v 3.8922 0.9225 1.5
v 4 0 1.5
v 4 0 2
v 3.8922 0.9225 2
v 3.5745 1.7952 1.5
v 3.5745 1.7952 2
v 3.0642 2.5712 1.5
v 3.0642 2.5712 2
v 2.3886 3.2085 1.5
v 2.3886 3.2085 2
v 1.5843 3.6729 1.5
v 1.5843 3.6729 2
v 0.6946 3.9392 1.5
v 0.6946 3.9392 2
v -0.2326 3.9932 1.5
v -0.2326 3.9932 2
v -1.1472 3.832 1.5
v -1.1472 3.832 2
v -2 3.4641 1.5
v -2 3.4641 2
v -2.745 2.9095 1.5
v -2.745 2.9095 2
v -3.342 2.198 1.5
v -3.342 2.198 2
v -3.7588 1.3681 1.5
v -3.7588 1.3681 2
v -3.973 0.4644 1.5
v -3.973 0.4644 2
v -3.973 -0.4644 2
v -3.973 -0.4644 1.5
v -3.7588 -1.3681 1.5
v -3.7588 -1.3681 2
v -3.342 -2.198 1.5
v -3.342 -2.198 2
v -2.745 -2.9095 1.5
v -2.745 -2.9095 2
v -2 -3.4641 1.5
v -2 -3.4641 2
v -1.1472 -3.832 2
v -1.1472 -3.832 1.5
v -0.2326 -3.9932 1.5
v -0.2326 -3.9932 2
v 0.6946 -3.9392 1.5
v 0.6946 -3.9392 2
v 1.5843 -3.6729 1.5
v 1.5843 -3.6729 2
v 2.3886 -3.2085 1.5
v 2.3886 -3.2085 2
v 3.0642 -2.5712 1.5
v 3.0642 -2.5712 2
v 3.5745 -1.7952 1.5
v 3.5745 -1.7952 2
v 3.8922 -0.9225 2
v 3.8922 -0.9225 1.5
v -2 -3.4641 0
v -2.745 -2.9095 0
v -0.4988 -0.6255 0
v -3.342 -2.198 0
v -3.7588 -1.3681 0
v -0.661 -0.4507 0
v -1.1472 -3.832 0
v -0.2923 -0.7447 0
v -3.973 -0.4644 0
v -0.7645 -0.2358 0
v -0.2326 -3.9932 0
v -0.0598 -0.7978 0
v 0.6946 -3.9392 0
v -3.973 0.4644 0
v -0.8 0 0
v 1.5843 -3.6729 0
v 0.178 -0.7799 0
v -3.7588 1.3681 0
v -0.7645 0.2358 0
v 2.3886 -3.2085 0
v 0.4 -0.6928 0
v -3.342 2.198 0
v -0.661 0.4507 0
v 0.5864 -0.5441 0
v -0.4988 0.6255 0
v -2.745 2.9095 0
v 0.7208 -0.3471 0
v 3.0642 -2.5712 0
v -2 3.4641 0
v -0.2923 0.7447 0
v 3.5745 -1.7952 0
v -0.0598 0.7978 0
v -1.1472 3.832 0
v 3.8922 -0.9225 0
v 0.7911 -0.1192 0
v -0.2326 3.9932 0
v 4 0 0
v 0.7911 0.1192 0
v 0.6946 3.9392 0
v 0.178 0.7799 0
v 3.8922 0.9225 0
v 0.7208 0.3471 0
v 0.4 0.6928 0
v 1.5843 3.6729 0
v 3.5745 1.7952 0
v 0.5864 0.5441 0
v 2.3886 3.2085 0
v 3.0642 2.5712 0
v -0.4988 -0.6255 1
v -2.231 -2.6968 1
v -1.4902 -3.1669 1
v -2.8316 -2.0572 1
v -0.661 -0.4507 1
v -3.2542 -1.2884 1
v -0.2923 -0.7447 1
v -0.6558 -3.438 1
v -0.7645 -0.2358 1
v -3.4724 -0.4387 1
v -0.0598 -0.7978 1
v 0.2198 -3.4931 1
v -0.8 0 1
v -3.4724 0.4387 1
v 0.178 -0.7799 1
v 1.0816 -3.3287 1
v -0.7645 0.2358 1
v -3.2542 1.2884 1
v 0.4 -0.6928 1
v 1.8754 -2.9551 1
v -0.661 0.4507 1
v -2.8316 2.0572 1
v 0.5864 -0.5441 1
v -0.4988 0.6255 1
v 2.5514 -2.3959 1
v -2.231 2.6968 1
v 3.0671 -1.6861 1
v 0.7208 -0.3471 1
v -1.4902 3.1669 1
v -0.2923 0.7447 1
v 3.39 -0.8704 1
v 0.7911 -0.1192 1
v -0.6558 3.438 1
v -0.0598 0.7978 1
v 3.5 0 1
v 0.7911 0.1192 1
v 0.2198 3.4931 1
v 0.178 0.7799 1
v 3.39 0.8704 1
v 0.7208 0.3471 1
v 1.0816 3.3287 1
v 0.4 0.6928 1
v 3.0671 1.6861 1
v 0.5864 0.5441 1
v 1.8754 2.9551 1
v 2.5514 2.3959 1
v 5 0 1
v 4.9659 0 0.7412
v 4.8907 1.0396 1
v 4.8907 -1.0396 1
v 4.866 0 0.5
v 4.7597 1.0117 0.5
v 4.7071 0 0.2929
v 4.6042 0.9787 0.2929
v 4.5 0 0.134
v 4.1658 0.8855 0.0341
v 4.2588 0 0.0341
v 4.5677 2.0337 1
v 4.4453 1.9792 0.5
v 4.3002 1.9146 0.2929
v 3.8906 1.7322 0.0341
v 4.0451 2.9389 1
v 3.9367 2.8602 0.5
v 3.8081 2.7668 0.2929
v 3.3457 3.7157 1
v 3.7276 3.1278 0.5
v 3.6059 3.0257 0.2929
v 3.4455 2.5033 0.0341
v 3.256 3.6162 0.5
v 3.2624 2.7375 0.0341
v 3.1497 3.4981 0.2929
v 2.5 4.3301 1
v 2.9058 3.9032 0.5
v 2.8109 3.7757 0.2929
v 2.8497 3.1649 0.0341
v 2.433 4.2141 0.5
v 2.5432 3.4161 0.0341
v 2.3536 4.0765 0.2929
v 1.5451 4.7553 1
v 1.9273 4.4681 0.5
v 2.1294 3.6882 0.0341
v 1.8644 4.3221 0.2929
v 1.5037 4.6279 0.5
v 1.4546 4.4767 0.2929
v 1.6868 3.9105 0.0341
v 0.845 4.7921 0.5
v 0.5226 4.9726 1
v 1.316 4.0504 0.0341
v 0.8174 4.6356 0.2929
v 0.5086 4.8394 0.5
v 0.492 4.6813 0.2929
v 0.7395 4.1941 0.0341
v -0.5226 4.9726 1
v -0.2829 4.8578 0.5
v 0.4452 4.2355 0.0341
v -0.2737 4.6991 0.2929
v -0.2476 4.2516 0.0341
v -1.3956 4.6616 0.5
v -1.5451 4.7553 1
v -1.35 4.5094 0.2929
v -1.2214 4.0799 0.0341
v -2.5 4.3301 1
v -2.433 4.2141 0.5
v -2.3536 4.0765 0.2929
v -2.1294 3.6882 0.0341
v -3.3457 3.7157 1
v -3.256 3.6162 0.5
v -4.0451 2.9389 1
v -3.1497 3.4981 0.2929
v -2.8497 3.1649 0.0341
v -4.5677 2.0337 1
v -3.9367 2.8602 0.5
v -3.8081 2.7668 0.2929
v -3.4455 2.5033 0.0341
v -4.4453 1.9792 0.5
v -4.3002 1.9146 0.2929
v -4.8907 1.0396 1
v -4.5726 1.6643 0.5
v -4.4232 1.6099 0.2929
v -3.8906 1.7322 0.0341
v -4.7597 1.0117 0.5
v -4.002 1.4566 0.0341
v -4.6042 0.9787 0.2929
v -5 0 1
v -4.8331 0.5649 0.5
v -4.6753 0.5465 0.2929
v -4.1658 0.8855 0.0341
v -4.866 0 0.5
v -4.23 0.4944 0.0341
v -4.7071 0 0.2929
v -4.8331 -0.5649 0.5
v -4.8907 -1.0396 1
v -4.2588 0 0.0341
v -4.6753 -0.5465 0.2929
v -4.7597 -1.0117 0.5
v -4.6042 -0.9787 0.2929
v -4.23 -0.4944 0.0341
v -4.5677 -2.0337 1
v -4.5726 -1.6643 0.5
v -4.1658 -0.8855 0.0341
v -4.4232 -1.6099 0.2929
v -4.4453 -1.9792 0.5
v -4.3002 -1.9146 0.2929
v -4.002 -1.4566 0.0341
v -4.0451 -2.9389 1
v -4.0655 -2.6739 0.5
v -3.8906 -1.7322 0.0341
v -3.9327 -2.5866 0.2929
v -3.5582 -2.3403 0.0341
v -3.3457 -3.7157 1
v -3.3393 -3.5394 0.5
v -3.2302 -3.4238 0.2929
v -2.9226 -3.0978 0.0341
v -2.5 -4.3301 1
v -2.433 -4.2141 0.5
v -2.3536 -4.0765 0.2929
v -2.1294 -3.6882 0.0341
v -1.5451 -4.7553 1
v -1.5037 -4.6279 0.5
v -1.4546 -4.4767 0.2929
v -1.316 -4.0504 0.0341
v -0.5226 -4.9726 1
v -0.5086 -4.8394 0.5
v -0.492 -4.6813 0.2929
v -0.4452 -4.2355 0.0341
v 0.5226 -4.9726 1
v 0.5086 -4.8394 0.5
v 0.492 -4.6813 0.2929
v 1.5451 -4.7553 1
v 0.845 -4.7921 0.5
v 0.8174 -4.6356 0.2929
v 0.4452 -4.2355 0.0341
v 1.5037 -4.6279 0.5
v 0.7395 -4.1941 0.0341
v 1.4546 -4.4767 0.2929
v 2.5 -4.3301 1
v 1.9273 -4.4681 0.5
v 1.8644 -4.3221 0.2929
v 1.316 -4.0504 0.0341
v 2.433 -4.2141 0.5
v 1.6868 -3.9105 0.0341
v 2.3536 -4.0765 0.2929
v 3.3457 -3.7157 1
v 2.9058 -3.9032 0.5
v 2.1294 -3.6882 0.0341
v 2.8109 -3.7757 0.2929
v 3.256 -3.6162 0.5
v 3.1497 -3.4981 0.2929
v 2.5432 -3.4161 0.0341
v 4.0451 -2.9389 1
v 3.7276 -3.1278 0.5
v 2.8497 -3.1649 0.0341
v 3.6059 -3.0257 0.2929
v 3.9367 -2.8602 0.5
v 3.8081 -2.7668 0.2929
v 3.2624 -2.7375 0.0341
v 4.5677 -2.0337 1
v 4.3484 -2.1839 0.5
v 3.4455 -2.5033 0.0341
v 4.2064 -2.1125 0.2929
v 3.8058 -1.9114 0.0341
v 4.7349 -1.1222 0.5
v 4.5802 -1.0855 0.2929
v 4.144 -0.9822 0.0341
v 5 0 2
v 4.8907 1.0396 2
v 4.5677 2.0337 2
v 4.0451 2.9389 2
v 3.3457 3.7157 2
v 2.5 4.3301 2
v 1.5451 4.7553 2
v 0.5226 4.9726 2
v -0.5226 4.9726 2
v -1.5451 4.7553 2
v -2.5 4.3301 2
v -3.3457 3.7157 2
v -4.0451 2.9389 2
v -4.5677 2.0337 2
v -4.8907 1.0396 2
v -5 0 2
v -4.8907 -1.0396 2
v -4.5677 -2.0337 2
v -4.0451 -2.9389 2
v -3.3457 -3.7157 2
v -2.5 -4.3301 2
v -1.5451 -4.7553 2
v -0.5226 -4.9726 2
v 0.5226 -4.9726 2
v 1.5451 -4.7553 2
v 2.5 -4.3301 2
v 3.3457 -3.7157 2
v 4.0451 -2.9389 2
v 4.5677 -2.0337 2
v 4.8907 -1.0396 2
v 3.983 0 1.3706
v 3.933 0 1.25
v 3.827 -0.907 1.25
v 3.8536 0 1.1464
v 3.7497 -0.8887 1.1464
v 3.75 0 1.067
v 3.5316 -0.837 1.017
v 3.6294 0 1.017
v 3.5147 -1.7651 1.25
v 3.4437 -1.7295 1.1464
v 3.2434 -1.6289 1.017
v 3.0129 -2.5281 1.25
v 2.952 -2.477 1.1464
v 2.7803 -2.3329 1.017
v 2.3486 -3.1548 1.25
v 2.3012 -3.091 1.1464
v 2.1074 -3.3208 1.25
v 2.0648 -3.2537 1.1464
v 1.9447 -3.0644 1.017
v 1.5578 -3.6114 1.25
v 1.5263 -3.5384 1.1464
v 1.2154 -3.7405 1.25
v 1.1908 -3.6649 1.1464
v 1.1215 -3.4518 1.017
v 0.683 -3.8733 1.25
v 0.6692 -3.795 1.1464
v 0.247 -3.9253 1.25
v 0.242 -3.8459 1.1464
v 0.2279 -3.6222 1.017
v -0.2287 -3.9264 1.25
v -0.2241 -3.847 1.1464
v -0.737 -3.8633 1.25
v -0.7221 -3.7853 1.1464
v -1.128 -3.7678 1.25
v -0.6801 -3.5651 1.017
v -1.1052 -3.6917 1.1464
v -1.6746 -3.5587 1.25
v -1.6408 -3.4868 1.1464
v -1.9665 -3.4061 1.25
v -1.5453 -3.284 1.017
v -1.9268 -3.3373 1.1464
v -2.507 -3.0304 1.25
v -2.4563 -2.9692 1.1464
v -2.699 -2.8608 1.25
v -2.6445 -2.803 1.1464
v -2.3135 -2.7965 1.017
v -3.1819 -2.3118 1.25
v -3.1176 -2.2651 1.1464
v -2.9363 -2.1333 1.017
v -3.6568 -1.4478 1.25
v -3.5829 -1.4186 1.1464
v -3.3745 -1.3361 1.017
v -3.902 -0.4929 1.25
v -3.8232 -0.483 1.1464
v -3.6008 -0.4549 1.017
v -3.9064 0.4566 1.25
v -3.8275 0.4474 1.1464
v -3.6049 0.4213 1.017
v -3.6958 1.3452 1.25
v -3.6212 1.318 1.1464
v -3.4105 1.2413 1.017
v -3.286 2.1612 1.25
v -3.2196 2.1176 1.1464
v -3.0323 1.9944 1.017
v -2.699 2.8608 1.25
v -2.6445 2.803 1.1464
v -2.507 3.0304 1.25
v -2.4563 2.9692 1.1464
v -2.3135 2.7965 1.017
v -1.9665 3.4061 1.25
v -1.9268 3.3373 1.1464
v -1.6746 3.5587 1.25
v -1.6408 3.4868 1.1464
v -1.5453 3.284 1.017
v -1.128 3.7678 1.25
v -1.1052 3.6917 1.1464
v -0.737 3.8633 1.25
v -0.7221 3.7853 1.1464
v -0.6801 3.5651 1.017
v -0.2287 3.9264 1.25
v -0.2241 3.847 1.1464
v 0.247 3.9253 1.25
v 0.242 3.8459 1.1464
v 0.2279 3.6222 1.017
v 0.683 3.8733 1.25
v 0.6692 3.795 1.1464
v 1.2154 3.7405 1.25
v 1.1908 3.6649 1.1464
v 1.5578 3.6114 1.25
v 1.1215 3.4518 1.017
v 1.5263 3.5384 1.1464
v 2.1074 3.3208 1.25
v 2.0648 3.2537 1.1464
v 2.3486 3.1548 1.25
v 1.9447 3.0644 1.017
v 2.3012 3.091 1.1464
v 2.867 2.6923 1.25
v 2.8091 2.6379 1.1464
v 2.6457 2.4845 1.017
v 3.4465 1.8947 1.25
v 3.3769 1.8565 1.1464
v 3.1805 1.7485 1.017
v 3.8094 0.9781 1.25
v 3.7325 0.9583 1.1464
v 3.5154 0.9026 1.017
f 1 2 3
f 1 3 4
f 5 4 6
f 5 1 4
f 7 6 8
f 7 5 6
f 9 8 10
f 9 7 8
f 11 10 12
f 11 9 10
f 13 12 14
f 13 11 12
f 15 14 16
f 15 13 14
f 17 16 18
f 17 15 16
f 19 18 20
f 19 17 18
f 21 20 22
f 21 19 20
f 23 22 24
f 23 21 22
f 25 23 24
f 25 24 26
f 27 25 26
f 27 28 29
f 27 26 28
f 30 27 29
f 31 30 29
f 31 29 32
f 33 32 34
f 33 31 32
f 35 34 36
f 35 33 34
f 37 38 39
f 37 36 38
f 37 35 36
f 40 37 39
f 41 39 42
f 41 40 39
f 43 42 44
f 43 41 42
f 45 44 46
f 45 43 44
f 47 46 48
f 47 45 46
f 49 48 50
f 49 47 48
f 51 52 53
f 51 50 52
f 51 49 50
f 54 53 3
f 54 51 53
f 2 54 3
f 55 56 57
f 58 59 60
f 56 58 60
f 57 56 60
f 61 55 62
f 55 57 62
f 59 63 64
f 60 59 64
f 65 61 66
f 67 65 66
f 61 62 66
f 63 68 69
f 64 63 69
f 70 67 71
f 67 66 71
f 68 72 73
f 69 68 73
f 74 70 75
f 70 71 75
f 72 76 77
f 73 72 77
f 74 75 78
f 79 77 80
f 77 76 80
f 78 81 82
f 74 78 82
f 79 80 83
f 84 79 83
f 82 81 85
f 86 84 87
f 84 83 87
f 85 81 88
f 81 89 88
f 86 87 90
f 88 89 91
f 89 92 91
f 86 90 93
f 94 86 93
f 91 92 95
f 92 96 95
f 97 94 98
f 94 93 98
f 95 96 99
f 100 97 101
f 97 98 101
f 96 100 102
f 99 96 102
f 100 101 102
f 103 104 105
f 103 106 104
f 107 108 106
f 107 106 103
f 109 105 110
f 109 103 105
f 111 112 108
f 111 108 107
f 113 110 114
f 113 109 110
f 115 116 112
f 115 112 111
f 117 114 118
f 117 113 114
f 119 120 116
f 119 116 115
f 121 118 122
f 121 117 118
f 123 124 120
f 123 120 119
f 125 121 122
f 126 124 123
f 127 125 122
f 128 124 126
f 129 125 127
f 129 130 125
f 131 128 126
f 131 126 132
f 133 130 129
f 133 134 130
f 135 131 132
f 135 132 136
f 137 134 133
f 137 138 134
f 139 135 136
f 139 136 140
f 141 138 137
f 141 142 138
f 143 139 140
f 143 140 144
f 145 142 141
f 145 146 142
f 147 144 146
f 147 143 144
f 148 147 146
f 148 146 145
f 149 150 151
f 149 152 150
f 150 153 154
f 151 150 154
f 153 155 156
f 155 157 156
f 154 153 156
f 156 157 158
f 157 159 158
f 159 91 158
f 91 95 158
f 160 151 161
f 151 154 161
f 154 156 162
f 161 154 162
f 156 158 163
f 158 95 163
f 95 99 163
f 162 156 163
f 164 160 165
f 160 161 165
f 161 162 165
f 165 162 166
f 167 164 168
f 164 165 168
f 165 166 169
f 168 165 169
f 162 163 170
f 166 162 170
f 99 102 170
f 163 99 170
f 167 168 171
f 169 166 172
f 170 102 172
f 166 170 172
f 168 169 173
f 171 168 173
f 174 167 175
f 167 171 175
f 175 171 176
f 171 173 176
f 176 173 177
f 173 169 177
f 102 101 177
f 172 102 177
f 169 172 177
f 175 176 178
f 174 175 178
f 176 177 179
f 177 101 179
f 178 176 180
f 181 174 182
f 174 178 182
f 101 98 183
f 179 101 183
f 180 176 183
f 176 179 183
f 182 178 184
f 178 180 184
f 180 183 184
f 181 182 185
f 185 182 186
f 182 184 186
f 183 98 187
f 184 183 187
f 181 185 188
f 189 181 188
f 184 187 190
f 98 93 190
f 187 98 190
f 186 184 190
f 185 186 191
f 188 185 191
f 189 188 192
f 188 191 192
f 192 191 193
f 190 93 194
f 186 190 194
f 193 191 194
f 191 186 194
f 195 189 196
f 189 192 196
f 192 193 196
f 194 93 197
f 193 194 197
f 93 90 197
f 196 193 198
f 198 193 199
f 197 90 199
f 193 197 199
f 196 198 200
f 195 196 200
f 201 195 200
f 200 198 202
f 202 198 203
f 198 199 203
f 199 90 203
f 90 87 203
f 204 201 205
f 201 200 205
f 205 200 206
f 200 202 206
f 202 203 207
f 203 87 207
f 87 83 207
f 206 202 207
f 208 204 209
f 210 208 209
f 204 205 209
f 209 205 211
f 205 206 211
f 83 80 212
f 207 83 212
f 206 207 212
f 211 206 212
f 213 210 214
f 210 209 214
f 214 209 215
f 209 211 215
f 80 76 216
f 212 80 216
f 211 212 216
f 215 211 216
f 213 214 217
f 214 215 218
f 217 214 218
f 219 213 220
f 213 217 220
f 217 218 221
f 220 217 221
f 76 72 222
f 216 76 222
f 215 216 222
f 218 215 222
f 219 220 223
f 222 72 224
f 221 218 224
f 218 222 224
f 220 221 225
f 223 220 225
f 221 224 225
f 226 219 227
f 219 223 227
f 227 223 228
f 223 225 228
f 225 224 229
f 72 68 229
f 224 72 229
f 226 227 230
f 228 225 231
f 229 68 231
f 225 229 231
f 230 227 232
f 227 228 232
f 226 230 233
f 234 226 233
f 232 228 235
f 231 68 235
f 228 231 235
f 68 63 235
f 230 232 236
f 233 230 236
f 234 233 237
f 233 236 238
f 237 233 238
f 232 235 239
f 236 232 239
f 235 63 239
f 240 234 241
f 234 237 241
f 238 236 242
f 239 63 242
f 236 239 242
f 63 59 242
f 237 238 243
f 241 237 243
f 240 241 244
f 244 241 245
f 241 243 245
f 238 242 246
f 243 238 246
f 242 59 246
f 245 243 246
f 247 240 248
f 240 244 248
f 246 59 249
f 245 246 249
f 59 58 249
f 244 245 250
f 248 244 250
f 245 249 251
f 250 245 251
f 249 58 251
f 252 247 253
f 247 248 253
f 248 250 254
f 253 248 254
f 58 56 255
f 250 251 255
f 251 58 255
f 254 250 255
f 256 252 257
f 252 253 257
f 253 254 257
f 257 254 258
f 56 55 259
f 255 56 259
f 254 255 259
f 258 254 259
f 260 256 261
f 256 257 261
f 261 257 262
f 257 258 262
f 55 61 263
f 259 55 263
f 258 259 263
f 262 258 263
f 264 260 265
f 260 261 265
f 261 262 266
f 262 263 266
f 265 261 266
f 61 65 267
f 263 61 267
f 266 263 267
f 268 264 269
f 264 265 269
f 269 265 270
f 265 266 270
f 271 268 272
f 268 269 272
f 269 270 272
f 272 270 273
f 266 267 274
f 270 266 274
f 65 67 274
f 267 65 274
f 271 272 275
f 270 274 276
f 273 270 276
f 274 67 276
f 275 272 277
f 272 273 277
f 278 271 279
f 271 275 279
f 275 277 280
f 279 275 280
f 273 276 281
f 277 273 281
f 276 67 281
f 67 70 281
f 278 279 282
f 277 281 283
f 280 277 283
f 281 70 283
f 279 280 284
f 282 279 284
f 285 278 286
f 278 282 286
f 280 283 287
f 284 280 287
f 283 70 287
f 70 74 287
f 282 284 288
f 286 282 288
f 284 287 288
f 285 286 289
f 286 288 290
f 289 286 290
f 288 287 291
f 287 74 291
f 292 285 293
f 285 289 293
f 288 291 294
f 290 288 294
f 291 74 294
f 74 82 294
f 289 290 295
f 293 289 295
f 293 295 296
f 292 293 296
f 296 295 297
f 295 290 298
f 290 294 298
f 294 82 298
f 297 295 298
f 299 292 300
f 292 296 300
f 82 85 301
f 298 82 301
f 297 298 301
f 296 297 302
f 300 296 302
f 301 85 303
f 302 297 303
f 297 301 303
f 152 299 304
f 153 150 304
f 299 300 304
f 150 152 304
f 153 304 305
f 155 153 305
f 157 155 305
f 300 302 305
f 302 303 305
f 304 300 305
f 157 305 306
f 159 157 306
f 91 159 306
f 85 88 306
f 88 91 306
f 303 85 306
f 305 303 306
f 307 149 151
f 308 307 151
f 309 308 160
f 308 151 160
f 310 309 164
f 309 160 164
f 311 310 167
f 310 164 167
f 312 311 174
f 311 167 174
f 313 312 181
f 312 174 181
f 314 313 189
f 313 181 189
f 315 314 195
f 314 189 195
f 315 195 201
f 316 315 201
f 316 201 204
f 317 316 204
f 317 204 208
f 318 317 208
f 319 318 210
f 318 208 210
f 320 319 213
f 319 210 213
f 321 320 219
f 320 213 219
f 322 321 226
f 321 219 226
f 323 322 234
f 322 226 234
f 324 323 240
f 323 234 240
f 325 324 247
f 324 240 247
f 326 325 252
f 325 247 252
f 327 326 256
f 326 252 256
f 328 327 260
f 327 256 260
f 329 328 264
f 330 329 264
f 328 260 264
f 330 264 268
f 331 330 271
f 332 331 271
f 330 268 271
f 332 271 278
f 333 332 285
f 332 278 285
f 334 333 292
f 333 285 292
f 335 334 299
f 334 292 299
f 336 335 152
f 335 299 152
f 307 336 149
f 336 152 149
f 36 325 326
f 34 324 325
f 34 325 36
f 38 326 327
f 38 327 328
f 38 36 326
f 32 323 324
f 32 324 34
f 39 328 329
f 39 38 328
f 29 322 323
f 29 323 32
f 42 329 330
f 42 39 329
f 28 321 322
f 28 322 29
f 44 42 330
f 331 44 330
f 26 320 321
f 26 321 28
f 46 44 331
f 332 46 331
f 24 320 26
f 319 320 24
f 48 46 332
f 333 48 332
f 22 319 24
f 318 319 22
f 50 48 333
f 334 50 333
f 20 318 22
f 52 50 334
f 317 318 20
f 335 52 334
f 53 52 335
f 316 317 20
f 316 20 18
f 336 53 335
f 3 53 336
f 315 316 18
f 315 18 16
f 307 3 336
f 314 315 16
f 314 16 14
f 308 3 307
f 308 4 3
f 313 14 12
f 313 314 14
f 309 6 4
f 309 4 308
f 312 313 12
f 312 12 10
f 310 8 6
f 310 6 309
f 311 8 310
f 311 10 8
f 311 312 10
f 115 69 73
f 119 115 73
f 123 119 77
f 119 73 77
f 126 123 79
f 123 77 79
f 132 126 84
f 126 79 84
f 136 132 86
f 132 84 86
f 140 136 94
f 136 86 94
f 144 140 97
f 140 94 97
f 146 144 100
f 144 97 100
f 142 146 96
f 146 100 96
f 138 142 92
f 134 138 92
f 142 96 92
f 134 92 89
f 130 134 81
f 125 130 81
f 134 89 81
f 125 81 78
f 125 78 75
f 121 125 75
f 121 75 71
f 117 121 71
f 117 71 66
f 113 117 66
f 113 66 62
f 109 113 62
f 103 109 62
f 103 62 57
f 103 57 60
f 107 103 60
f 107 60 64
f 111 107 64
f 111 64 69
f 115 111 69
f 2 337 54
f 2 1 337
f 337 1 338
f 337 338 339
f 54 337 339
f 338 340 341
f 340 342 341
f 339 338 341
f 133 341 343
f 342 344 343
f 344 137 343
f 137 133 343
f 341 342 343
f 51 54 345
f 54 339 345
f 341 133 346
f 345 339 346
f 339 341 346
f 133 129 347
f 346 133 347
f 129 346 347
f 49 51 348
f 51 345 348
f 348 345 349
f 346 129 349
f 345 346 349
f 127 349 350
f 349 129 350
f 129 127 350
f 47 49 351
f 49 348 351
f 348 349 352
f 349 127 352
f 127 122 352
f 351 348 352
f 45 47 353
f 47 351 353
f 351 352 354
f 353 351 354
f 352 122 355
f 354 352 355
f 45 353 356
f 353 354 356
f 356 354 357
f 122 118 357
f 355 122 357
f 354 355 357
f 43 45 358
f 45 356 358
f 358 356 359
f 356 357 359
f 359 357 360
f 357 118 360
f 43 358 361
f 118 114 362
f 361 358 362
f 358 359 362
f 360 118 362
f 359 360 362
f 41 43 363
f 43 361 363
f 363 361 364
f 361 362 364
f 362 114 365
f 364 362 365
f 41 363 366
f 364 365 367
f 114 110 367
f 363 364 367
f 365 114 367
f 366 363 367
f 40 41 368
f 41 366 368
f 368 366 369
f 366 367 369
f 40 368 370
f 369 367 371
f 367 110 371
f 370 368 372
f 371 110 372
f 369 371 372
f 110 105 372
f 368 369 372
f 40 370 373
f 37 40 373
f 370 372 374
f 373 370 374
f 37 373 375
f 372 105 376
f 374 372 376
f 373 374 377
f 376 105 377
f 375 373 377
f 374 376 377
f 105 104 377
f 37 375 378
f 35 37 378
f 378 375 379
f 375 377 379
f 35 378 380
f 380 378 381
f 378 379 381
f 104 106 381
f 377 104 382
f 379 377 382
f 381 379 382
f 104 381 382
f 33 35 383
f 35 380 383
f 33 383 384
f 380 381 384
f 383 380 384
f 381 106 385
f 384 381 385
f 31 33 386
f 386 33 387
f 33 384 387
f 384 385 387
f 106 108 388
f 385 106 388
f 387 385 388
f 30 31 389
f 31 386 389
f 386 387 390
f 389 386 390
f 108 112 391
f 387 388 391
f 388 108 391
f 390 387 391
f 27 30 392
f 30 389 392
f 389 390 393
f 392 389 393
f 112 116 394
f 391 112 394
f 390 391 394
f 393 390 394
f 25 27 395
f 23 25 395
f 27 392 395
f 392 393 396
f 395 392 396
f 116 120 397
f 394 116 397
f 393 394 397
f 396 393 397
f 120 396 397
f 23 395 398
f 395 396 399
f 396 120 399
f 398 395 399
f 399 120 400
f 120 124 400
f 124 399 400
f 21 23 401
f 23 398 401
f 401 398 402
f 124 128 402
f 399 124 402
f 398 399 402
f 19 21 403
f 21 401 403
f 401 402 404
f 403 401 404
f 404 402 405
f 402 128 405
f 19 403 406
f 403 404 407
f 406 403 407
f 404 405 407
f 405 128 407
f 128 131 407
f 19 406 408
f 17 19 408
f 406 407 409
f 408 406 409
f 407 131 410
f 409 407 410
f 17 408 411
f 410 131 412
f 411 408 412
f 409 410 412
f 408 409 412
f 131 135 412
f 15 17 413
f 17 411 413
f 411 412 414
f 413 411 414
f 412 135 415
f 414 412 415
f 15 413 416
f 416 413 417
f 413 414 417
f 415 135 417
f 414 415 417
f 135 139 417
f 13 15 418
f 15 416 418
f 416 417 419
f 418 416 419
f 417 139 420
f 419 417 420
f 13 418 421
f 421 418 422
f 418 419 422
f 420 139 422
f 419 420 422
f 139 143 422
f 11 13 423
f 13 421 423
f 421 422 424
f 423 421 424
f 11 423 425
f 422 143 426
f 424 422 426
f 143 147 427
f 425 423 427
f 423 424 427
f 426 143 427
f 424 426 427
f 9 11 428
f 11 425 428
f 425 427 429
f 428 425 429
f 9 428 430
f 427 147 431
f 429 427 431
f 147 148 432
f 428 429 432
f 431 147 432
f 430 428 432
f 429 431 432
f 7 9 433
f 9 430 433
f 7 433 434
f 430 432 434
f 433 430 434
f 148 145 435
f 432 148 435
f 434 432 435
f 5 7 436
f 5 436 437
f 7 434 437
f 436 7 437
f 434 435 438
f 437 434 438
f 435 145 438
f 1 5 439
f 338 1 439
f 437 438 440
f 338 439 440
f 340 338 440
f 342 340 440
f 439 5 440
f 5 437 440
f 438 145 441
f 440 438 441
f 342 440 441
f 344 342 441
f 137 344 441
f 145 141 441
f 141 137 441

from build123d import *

# Parameters (mm, degrees)
SKETCH_1_R             = 5
EXTRUDE_1_DEPTH        = 2
SHELL_1_T              = -1
FILLET_1_R             = 0.5
FILLET_2_R             = 1
HOLE_WIZARD_M2_1_D     = 1.6
HOLE_WIZARD_M2_1_DEPTH = 5.2
HOLE_WIZARD_M2_1_TIP   = 0.480688495


with BuildPart() as part:
    # 草图1 → 凸台-拉伸1 (new body)
    with BuildSketch(Plane.XY):
        Circle(SKETCH_1_R)
    extrude(amount=EXTRUDE_1_DEPTH)

    # 抽壳1
    shell_1_openings = [part.faces().sort_by_distance(p)[0] for p in [
        (0, 0, 2),
    ]]
    offset(amount=SHELL_1_T, openings=shell_1_openings, kind=Kind.INTERSECTION)

    # 圆角1
    fillet_1_edges = [part.edges().sort_by_distance(p)[0] for p in [
        (-4, 0, 1),
    ]]
    fillet(fillet_1_edges, radius=FILLET_1_R)

    # 圆角2
    fillet_2_edges = [part.edges().sort_by_distance(p)[0] for p in [
        (-5, 0, 0),
    ]]
    fillet(fillet_2_edges, radius=FILLET_2_R)

    # M2 螺纹孔1
    with Locations(Plane.XY.offset(1)):
        with Locations((0, 0)):
            Hole(HOLE_WIZARD_M2_1_D / 2, depth=HOLE_WIZARD_M2_1_DEPTH)
            with Locations((0, 0, -(HOLE_WIZARD_M2_1_DEPTH + HOLE_WIZARD_M2_1_TIP / 2))):  # 118° drill point
                Cone(0, HOLE_WIZARD_M2_1_D / 2, HOLE_WIZARD_M2_1_TIP, mode=Mode.SUBTRACT)


solid = part.part
